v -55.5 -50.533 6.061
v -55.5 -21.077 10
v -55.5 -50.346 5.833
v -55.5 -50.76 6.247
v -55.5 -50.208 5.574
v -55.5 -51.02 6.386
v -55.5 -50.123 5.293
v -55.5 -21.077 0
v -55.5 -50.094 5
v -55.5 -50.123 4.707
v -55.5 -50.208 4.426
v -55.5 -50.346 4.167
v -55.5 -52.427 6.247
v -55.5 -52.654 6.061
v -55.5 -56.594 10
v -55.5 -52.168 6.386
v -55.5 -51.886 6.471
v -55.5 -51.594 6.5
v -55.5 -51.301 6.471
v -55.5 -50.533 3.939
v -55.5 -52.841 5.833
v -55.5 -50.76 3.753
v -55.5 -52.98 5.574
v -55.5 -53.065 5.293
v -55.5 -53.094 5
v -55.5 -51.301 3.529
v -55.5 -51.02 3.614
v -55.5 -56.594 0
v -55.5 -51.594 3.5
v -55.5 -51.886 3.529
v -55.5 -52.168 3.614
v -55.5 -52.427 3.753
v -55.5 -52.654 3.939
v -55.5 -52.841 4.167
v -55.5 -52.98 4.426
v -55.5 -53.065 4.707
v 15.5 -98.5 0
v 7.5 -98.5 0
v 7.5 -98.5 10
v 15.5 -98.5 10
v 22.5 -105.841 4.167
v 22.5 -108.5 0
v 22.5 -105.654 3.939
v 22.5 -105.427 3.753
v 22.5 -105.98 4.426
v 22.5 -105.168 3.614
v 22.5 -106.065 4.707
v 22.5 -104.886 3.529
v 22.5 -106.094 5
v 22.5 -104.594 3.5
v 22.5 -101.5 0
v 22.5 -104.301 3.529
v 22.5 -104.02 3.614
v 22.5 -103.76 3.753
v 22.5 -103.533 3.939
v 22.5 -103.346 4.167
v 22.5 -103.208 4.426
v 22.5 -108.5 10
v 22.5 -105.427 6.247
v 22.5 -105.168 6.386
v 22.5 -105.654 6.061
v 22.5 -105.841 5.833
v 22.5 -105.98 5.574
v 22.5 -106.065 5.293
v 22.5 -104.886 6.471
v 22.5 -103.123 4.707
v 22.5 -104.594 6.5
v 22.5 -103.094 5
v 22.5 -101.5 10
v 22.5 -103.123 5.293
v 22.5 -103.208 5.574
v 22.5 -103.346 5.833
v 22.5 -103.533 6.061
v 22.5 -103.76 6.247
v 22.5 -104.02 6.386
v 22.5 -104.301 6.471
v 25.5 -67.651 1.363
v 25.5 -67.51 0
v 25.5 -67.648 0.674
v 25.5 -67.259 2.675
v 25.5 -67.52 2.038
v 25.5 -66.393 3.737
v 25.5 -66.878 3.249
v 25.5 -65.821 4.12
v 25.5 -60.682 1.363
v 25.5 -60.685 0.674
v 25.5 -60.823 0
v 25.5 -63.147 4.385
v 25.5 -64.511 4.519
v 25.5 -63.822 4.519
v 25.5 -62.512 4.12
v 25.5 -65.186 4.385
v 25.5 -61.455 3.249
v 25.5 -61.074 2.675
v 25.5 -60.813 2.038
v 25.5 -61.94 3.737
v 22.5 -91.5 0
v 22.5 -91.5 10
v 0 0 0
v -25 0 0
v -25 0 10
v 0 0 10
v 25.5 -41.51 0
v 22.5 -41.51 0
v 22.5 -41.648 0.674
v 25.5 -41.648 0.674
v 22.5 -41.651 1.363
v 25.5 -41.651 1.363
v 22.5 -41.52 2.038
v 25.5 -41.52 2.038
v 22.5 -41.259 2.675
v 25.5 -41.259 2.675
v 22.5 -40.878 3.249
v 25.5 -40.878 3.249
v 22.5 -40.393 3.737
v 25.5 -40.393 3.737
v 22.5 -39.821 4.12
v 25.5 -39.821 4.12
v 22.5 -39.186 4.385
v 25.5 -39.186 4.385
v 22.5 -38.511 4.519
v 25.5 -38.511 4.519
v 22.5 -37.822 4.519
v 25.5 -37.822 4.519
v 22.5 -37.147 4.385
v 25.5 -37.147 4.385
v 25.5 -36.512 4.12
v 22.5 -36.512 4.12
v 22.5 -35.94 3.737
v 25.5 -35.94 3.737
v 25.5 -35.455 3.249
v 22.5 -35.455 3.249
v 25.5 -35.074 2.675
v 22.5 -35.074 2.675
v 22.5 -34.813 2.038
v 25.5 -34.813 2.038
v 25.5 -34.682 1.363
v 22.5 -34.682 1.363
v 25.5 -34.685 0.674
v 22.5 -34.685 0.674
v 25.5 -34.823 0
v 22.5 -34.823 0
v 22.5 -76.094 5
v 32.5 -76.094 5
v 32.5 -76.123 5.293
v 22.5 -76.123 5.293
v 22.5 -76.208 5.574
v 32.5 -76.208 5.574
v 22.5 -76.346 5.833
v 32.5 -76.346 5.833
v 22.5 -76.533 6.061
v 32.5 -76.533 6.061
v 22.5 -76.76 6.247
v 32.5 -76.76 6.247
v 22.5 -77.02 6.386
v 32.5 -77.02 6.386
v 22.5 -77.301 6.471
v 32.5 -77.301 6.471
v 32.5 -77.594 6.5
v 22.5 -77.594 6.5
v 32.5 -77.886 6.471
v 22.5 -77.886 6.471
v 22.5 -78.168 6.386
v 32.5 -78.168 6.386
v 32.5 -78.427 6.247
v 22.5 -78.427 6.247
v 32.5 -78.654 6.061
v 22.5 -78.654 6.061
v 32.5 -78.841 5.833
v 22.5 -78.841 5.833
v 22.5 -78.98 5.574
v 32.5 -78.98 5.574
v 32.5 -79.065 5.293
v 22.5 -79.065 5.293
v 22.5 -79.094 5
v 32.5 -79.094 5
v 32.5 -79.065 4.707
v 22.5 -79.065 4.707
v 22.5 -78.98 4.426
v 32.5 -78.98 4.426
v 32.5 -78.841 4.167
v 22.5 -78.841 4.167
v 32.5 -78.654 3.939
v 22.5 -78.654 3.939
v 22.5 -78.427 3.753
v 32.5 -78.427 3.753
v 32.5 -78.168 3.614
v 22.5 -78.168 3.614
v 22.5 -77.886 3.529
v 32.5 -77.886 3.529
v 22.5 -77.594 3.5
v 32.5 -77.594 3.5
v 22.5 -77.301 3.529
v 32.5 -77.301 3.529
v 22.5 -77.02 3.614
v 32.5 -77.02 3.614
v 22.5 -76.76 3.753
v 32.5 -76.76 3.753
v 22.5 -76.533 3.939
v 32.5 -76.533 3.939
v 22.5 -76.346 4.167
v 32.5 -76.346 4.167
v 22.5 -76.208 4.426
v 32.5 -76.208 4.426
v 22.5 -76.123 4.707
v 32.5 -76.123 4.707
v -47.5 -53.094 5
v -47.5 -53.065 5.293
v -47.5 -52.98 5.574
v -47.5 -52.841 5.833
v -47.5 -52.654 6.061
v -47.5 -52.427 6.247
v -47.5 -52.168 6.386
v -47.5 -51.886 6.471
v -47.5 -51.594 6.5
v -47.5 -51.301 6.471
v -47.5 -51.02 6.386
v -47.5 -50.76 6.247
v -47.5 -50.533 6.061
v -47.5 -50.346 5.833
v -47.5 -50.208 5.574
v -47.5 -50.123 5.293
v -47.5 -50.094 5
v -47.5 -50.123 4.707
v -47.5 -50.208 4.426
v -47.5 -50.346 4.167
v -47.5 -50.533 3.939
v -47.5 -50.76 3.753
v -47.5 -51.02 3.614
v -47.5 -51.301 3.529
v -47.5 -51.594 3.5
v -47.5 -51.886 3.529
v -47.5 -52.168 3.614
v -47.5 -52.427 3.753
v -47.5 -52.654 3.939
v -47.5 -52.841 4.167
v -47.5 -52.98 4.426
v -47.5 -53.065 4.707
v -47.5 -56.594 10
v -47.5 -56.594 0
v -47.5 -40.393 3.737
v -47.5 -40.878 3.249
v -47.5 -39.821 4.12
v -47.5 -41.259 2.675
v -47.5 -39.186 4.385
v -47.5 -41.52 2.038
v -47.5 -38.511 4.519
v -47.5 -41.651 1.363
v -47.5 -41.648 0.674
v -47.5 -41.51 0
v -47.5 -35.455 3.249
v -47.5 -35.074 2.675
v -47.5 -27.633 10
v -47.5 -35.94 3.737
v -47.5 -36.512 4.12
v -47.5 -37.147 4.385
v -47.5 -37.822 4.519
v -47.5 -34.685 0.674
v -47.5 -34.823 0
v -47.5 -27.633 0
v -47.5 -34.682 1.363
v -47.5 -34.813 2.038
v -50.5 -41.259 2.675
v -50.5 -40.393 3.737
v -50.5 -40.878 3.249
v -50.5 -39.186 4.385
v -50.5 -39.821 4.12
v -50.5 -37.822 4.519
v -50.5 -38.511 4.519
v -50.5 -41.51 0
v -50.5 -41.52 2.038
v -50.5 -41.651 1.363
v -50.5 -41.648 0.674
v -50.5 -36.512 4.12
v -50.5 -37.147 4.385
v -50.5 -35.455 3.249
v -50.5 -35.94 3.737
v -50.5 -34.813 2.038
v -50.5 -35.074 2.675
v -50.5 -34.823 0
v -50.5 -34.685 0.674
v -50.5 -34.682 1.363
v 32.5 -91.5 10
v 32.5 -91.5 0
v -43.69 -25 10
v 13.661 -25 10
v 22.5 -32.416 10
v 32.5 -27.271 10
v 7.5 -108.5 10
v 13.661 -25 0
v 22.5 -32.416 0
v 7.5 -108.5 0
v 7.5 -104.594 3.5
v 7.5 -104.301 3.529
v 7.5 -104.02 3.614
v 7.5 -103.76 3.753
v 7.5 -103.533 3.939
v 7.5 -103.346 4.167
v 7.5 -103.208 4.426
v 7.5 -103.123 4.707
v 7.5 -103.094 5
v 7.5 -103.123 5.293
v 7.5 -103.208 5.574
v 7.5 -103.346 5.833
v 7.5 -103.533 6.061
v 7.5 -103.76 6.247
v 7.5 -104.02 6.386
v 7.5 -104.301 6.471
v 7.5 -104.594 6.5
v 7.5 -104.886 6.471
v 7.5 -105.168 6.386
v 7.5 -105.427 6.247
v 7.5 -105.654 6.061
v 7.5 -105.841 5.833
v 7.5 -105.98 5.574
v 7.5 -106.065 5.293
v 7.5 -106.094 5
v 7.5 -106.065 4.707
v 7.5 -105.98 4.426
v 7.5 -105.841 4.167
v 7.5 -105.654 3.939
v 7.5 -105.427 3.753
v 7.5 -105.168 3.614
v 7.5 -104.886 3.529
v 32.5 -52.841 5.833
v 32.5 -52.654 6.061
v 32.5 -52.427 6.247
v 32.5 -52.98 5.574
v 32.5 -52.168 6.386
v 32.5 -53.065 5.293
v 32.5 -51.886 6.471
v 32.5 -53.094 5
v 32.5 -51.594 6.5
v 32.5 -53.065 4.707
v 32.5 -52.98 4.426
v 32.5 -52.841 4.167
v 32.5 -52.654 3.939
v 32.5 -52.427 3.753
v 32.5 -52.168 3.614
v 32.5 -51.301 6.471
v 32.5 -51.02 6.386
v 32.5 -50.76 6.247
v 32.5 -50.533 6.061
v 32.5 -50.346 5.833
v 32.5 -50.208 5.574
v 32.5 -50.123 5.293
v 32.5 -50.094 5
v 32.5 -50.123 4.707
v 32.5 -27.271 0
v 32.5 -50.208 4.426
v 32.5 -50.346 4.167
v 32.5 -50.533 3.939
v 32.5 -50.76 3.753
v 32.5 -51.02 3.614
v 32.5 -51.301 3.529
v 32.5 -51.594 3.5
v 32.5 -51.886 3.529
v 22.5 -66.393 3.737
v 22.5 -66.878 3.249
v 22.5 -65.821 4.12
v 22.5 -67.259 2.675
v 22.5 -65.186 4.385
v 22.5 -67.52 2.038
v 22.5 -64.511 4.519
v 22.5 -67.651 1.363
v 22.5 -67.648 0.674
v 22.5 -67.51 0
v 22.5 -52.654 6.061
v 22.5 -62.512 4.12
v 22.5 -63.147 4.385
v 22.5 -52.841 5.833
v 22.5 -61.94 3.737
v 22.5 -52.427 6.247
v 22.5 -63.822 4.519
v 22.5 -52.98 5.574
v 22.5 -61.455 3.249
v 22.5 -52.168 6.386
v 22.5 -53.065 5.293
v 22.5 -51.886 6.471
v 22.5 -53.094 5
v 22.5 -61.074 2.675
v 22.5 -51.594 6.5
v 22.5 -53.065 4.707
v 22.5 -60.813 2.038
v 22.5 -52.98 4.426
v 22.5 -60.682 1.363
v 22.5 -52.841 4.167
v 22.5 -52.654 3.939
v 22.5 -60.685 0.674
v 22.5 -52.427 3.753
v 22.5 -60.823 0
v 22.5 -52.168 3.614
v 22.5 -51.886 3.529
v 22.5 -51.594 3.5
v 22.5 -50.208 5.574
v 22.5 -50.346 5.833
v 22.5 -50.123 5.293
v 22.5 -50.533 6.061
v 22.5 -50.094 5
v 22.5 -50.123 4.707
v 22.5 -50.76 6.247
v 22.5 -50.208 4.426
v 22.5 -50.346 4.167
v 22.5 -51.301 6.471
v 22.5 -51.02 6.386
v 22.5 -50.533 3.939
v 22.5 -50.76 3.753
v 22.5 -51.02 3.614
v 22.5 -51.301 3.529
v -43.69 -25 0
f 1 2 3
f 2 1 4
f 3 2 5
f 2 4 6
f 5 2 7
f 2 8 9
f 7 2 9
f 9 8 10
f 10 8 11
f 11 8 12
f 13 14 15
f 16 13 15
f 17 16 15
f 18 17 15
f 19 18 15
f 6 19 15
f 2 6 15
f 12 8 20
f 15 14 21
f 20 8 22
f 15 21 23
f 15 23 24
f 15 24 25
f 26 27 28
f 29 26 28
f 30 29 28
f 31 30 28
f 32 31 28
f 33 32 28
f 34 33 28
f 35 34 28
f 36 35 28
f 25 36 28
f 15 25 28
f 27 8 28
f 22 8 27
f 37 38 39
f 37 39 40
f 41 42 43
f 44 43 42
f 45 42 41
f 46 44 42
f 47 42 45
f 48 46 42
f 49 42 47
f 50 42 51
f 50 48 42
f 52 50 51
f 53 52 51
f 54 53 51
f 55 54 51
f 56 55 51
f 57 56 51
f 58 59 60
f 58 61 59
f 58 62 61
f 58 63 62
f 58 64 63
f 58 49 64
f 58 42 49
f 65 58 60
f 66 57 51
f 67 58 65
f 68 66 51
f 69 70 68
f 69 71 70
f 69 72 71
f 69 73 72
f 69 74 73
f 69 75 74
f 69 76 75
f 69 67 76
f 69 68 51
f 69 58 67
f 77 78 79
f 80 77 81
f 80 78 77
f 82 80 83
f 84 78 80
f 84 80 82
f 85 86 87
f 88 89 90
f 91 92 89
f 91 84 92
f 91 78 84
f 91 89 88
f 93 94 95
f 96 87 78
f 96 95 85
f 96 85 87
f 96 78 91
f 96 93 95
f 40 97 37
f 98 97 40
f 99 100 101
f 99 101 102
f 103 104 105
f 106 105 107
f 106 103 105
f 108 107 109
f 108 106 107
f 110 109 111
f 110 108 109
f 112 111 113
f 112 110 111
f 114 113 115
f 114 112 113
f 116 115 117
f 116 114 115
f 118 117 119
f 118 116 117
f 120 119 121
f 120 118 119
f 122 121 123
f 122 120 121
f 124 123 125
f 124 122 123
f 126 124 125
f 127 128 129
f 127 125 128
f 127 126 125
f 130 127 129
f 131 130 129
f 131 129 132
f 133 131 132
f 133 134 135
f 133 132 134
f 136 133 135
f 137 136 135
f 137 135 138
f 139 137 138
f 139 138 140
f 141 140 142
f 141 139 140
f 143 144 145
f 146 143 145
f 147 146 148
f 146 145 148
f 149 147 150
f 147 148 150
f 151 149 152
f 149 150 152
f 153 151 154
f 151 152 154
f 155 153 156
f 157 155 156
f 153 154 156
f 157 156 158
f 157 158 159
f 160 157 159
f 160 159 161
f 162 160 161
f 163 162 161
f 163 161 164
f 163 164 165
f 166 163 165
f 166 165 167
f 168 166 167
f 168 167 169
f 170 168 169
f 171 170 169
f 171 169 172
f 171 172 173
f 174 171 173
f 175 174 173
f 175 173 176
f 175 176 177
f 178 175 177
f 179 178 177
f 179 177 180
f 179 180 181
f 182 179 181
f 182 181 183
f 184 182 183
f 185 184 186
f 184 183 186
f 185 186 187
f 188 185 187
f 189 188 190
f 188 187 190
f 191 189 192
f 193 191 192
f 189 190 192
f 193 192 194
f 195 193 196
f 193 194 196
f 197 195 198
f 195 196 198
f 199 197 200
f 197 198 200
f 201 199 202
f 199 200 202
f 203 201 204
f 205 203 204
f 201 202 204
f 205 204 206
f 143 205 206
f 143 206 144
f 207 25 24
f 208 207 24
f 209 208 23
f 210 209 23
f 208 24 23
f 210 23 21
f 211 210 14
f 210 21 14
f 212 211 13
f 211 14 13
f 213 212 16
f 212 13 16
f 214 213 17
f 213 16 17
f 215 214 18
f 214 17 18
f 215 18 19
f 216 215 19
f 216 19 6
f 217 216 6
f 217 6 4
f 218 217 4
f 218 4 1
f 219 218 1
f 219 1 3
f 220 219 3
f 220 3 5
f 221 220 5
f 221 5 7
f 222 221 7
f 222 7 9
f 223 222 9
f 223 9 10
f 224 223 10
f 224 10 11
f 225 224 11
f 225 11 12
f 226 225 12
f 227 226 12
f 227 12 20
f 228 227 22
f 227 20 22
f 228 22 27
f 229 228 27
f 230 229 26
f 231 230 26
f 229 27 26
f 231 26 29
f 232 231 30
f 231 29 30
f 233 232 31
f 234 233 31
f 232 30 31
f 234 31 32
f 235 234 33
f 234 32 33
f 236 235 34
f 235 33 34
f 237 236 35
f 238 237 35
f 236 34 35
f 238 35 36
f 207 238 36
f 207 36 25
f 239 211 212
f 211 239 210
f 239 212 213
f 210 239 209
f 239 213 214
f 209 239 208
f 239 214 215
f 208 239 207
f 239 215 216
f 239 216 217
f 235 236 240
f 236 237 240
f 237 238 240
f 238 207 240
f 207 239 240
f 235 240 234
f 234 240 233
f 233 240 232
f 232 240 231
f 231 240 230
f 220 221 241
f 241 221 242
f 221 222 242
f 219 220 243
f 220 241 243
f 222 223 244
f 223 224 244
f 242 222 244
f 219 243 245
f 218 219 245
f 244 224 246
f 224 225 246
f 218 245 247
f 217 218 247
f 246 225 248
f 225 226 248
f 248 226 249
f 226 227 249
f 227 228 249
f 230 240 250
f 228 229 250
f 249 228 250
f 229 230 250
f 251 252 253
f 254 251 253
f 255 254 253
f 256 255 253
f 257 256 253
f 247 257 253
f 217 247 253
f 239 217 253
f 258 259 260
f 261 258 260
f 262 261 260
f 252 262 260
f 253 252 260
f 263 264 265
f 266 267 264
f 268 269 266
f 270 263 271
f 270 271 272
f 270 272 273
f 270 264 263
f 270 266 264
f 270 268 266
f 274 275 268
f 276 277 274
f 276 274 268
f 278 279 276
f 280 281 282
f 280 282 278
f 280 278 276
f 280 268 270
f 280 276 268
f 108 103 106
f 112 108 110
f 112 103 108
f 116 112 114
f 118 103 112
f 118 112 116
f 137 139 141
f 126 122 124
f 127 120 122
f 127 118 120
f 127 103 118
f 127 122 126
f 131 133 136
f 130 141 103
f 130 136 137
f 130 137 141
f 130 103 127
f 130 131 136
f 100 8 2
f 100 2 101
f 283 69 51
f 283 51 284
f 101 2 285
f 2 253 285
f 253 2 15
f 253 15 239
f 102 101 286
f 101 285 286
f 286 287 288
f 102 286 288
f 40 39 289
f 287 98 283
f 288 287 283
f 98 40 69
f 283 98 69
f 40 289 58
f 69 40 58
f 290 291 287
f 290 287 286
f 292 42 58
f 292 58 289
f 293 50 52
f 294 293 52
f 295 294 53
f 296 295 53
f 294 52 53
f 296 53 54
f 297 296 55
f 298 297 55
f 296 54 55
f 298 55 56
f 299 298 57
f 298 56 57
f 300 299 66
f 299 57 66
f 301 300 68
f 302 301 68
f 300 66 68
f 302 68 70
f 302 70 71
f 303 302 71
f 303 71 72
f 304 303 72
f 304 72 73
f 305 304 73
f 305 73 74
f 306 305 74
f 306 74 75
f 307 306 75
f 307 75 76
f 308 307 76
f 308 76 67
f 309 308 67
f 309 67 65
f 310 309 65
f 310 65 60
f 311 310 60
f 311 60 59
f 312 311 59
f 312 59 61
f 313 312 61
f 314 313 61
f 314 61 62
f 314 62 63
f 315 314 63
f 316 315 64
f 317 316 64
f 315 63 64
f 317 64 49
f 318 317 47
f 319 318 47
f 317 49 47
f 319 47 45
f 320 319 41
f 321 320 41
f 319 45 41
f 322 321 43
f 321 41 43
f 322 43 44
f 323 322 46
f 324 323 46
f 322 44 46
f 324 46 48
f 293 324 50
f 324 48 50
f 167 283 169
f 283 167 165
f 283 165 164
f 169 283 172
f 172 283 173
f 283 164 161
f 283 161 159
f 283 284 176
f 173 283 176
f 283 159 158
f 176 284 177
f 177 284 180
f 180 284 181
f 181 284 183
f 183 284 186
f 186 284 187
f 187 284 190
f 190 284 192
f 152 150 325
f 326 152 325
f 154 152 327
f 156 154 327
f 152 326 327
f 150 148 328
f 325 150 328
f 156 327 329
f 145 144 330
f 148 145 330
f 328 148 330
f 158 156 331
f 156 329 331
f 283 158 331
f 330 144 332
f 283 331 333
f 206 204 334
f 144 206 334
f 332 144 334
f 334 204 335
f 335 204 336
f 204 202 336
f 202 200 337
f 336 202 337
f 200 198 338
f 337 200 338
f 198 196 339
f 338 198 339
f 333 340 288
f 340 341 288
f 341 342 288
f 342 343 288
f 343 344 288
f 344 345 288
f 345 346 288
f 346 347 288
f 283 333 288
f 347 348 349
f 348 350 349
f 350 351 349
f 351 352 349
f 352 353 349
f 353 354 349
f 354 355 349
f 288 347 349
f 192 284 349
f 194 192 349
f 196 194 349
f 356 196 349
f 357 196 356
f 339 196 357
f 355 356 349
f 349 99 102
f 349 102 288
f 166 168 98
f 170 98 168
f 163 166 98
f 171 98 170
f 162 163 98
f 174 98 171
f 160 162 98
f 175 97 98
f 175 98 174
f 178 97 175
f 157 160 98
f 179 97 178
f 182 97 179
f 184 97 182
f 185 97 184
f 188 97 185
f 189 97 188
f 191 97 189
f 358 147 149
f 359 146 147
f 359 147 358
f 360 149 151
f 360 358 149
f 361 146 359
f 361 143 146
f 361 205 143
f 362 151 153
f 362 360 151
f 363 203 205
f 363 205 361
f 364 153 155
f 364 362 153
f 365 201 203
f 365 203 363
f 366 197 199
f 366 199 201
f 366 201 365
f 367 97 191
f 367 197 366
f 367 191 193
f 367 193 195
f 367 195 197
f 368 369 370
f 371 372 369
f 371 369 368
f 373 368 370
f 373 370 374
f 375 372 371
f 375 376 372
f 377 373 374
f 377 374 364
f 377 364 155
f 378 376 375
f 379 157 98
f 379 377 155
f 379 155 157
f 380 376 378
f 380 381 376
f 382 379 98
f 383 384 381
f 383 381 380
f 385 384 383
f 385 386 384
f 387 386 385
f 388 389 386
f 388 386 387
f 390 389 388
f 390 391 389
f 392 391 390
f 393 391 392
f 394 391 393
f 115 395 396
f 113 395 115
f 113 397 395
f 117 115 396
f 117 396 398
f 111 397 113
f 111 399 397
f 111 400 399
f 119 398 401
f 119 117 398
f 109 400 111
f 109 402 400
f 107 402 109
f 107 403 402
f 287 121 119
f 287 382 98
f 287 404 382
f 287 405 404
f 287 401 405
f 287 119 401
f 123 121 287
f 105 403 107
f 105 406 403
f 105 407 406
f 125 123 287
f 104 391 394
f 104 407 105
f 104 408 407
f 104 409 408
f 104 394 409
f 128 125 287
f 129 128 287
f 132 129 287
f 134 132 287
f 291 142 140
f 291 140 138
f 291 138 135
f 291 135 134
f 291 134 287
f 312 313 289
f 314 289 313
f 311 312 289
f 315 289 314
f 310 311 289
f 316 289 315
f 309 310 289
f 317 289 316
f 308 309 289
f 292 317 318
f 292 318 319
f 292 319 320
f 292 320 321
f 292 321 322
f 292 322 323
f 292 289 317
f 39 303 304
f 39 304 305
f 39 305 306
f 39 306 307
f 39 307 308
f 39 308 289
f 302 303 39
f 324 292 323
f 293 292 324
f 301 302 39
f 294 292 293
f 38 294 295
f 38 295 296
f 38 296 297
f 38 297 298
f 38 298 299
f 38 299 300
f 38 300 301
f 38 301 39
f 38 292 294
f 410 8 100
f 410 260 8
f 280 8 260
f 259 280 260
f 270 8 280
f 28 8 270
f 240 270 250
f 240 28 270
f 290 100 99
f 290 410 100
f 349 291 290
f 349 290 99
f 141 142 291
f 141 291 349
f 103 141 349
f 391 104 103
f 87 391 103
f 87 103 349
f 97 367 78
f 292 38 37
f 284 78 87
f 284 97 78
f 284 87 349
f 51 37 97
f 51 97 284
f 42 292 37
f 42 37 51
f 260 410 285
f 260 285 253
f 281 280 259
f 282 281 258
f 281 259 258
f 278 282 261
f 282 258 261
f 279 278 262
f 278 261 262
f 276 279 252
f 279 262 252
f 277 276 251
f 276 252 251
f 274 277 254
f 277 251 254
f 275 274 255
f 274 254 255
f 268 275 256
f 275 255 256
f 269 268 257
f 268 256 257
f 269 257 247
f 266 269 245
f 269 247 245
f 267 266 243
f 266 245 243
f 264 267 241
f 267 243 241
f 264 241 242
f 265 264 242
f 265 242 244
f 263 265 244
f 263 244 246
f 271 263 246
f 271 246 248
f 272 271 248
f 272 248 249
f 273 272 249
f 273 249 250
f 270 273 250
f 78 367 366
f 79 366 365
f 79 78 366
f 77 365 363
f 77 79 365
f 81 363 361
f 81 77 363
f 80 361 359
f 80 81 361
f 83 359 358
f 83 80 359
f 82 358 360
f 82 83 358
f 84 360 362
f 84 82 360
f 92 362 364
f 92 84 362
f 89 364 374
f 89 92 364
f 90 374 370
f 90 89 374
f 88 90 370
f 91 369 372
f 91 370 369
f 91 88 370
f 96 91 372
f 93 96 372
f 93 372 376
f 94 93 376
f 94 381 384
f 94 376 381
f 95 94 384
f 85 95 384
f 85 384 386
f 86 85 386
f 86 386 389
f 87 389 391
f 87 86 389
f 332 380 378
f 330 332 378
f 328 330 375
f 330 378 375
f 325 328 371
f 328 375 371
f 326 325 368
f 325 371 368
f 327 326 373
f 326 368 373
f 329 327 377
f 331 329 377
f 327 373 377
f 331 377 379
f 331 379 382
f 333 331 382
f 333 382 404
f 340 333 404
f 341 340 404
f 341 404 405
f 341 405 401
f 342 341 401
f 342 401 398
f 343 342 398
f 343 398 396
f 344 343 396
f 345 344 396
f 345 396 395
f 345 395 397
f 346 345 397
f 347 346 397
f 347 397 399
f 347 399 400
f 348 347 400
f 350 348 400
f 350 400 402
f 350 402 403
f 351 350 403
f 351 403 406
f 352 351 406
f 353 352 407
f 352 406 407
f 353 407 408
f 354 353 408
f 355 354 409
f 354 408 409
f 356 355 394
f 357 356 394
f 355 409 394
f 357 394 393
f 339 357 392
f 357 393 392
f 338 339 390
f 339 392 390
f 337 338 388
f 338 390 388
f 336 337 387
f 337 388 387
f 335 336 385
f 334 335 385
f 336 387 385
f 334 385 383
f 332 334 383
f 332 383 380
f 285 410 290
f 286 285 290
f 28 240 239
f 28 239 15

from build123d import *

# Parameters (mm, degrees)
BOSS_EXTRUDE1_DEPTH = 10
SKETCH2_R           = 1.5
CUT_EXTRUDE1_DEPTH  = 141.05802369
CUT_EXTRUDE2_REACH  = 142.058
SKETCH3_R           = 1.5
CHAMFER2_SIZE       = 7
CUT_EXTRUDE3_REACH  = 124.28
CUT_EXTRUDE4_REACH  = 136.001
SKETCH5_R           = 1.5
SKETCH9_R           = 3.5
CUT_EXTRUDE7_DEPTH  = 3
CUT_EXTRUDE8_START  = -3
SKETCH10_R          = 3.5
CUT_EXTRUDE8_DEPTH  = 3


with BuildPart() as part:
    # Sketch1 → Boss-Extrude1 (new body)
    with BuildSketch(Plane(origin=(0, 0, 0), x_dir=(-1, 0, 0), z_dir=(0, 0, 1))):
        Polygon((47.5, 36.642135619), (47.5, 56.593701556), (55.5, 56.593701556), (55.5, 30.499999996), (55.5, 21.076918494), (25, 0), (0, 0), (-32.5, 27.270738013), (-32.5, 40.5), (-32.5, 108.5), (-7.5, 108.5), (-7.5, 98.5), (-22.5, 98.5), (-22.5, 32.416456895), (-13.661410851, 25), (35.857864376, 25), (43.690340999, 25), (47.5, 27.632651549), align=None)
    extrude(amount=BOSS_EXTRUDE1_DEPTH)

    # Sketch2 → Cut-Extrude1 (cut, through all)
    with BuildSketch(Plane.ZY.offset(55.5)):
        with Locations(Location((5, -51.593701556, 0), (0, 0, 270))):
            Circle(SKETCH2_R)
    extrude(amount=-CUT_EXTRUDE1_DEPTH, mode=Mode.SUBTRACT)

    # Sketch3 → Cut-Extrude2 (cut, up to next)
    with BuildSketch(Plane(origin=(32.5, 0, 0), x_dir=(0, 0, -1), z_dir=(1, 0, 0)), mode=Mode.PRIVATE) as cut_extrude2_sk1:
        with Locations(Location((-5, -77.593701556, 0), (0, 0, 90))):
            Circle(SKETCH3_R)
    cut_extrude2_tool1 = extrude(cut_extrude2_sk1.sketch, amount=-CUT_EXTRUDE2_REACH, mode=Mode.PRIVATE) & part.part
    add(cut_extrude2_tool1.solids().sort_by_distance((32.5, -77.593702, 5))[0], mode=Mode.SUBTRACT)

    # Chamfer2
    chamfer2_edges = [part.edges().sort_by_distance(p)[0] for p in [
        (22.5, -98.5, 5),
    ]]
    chamfer(chamfer2_edges, length=CHAMFER2_SIZE)

    # Sketch4 → Cut-Extrude3 (cut, up to next)
    with BuildSketch(Plane.XY.offset(10), mode=Mode.PRIVATE) as cut_extrude3_sk1:
        Polygon((22.5, -108.5), (22.5, -101.5), (32.5, -91.5), (32.5, -108.5), align=None)
    cut_extrude3_tool1 = extrude(cut_extrude3_sk1.sketch, amount=-CUT_EXTRUDE3_REACH, mode=Mode.PRIVATE) & part.part
    add(cut_extrude3_tool1.solids().sort_by_distance((28.194444, -102.152778, 10))[0], mode=Mode.SUBTRACT)

    # Sketch5 → Cut-Extrude4 (cut, up to next)
    with BuildSketch(Plane(origin=(22.5, 0, 0), x_dir=(0, 0, -1), z_dir=(1, 0, 0)), mode=Mode.PRIVATE) as cut_extrude4_sk1:
        with Locations((-5, -104.593701556)):
            Circle(SKETCH5_R)
    cut_extrude4_tool1 = extrude(cut_extrude4_sk1.sketch, amount=-CUT_EXTRUDE4_REACH, mode=Mode.PRIVATE) & part.part
    add(cut_extrude4_tool1.solids().sort_by_distance((22.5, -104.593702, 5))[0], mode=Mode.SUBTRACT)

    # Sketch9 → Cut-Extrude7 (cut)
    with BuildSketch(Plane(origin=(-47.5, 0, 0), x_dir=(0, 0, -1), z_dir=(1, 0, 0))):
        with Locations((-1.036207833, -38.166551759)):
            Circle(SKETCH9_R)
    extrude(amount=-CUT_EXTRUDE7_DEPTH, mode=Mode.SUBTRACT)

    # Sketch10 → Cut-Extrude8 (cut)
    with BuildSketch(Plane.ZY.offset(-22.5).offset(CUT_EXTRUDE8_START)):
        with Locations((1.036207833, -38.166551759)):
            Circle(SKETCH10_R)
        with Locations((1.036207833, -64.166551759)):
            Circle(SKETCH10_R)
    extrude(amount=CUT_EXTRUDE8_DEPTH, mode=Mode.SUBTRACT)


solid = part.part
